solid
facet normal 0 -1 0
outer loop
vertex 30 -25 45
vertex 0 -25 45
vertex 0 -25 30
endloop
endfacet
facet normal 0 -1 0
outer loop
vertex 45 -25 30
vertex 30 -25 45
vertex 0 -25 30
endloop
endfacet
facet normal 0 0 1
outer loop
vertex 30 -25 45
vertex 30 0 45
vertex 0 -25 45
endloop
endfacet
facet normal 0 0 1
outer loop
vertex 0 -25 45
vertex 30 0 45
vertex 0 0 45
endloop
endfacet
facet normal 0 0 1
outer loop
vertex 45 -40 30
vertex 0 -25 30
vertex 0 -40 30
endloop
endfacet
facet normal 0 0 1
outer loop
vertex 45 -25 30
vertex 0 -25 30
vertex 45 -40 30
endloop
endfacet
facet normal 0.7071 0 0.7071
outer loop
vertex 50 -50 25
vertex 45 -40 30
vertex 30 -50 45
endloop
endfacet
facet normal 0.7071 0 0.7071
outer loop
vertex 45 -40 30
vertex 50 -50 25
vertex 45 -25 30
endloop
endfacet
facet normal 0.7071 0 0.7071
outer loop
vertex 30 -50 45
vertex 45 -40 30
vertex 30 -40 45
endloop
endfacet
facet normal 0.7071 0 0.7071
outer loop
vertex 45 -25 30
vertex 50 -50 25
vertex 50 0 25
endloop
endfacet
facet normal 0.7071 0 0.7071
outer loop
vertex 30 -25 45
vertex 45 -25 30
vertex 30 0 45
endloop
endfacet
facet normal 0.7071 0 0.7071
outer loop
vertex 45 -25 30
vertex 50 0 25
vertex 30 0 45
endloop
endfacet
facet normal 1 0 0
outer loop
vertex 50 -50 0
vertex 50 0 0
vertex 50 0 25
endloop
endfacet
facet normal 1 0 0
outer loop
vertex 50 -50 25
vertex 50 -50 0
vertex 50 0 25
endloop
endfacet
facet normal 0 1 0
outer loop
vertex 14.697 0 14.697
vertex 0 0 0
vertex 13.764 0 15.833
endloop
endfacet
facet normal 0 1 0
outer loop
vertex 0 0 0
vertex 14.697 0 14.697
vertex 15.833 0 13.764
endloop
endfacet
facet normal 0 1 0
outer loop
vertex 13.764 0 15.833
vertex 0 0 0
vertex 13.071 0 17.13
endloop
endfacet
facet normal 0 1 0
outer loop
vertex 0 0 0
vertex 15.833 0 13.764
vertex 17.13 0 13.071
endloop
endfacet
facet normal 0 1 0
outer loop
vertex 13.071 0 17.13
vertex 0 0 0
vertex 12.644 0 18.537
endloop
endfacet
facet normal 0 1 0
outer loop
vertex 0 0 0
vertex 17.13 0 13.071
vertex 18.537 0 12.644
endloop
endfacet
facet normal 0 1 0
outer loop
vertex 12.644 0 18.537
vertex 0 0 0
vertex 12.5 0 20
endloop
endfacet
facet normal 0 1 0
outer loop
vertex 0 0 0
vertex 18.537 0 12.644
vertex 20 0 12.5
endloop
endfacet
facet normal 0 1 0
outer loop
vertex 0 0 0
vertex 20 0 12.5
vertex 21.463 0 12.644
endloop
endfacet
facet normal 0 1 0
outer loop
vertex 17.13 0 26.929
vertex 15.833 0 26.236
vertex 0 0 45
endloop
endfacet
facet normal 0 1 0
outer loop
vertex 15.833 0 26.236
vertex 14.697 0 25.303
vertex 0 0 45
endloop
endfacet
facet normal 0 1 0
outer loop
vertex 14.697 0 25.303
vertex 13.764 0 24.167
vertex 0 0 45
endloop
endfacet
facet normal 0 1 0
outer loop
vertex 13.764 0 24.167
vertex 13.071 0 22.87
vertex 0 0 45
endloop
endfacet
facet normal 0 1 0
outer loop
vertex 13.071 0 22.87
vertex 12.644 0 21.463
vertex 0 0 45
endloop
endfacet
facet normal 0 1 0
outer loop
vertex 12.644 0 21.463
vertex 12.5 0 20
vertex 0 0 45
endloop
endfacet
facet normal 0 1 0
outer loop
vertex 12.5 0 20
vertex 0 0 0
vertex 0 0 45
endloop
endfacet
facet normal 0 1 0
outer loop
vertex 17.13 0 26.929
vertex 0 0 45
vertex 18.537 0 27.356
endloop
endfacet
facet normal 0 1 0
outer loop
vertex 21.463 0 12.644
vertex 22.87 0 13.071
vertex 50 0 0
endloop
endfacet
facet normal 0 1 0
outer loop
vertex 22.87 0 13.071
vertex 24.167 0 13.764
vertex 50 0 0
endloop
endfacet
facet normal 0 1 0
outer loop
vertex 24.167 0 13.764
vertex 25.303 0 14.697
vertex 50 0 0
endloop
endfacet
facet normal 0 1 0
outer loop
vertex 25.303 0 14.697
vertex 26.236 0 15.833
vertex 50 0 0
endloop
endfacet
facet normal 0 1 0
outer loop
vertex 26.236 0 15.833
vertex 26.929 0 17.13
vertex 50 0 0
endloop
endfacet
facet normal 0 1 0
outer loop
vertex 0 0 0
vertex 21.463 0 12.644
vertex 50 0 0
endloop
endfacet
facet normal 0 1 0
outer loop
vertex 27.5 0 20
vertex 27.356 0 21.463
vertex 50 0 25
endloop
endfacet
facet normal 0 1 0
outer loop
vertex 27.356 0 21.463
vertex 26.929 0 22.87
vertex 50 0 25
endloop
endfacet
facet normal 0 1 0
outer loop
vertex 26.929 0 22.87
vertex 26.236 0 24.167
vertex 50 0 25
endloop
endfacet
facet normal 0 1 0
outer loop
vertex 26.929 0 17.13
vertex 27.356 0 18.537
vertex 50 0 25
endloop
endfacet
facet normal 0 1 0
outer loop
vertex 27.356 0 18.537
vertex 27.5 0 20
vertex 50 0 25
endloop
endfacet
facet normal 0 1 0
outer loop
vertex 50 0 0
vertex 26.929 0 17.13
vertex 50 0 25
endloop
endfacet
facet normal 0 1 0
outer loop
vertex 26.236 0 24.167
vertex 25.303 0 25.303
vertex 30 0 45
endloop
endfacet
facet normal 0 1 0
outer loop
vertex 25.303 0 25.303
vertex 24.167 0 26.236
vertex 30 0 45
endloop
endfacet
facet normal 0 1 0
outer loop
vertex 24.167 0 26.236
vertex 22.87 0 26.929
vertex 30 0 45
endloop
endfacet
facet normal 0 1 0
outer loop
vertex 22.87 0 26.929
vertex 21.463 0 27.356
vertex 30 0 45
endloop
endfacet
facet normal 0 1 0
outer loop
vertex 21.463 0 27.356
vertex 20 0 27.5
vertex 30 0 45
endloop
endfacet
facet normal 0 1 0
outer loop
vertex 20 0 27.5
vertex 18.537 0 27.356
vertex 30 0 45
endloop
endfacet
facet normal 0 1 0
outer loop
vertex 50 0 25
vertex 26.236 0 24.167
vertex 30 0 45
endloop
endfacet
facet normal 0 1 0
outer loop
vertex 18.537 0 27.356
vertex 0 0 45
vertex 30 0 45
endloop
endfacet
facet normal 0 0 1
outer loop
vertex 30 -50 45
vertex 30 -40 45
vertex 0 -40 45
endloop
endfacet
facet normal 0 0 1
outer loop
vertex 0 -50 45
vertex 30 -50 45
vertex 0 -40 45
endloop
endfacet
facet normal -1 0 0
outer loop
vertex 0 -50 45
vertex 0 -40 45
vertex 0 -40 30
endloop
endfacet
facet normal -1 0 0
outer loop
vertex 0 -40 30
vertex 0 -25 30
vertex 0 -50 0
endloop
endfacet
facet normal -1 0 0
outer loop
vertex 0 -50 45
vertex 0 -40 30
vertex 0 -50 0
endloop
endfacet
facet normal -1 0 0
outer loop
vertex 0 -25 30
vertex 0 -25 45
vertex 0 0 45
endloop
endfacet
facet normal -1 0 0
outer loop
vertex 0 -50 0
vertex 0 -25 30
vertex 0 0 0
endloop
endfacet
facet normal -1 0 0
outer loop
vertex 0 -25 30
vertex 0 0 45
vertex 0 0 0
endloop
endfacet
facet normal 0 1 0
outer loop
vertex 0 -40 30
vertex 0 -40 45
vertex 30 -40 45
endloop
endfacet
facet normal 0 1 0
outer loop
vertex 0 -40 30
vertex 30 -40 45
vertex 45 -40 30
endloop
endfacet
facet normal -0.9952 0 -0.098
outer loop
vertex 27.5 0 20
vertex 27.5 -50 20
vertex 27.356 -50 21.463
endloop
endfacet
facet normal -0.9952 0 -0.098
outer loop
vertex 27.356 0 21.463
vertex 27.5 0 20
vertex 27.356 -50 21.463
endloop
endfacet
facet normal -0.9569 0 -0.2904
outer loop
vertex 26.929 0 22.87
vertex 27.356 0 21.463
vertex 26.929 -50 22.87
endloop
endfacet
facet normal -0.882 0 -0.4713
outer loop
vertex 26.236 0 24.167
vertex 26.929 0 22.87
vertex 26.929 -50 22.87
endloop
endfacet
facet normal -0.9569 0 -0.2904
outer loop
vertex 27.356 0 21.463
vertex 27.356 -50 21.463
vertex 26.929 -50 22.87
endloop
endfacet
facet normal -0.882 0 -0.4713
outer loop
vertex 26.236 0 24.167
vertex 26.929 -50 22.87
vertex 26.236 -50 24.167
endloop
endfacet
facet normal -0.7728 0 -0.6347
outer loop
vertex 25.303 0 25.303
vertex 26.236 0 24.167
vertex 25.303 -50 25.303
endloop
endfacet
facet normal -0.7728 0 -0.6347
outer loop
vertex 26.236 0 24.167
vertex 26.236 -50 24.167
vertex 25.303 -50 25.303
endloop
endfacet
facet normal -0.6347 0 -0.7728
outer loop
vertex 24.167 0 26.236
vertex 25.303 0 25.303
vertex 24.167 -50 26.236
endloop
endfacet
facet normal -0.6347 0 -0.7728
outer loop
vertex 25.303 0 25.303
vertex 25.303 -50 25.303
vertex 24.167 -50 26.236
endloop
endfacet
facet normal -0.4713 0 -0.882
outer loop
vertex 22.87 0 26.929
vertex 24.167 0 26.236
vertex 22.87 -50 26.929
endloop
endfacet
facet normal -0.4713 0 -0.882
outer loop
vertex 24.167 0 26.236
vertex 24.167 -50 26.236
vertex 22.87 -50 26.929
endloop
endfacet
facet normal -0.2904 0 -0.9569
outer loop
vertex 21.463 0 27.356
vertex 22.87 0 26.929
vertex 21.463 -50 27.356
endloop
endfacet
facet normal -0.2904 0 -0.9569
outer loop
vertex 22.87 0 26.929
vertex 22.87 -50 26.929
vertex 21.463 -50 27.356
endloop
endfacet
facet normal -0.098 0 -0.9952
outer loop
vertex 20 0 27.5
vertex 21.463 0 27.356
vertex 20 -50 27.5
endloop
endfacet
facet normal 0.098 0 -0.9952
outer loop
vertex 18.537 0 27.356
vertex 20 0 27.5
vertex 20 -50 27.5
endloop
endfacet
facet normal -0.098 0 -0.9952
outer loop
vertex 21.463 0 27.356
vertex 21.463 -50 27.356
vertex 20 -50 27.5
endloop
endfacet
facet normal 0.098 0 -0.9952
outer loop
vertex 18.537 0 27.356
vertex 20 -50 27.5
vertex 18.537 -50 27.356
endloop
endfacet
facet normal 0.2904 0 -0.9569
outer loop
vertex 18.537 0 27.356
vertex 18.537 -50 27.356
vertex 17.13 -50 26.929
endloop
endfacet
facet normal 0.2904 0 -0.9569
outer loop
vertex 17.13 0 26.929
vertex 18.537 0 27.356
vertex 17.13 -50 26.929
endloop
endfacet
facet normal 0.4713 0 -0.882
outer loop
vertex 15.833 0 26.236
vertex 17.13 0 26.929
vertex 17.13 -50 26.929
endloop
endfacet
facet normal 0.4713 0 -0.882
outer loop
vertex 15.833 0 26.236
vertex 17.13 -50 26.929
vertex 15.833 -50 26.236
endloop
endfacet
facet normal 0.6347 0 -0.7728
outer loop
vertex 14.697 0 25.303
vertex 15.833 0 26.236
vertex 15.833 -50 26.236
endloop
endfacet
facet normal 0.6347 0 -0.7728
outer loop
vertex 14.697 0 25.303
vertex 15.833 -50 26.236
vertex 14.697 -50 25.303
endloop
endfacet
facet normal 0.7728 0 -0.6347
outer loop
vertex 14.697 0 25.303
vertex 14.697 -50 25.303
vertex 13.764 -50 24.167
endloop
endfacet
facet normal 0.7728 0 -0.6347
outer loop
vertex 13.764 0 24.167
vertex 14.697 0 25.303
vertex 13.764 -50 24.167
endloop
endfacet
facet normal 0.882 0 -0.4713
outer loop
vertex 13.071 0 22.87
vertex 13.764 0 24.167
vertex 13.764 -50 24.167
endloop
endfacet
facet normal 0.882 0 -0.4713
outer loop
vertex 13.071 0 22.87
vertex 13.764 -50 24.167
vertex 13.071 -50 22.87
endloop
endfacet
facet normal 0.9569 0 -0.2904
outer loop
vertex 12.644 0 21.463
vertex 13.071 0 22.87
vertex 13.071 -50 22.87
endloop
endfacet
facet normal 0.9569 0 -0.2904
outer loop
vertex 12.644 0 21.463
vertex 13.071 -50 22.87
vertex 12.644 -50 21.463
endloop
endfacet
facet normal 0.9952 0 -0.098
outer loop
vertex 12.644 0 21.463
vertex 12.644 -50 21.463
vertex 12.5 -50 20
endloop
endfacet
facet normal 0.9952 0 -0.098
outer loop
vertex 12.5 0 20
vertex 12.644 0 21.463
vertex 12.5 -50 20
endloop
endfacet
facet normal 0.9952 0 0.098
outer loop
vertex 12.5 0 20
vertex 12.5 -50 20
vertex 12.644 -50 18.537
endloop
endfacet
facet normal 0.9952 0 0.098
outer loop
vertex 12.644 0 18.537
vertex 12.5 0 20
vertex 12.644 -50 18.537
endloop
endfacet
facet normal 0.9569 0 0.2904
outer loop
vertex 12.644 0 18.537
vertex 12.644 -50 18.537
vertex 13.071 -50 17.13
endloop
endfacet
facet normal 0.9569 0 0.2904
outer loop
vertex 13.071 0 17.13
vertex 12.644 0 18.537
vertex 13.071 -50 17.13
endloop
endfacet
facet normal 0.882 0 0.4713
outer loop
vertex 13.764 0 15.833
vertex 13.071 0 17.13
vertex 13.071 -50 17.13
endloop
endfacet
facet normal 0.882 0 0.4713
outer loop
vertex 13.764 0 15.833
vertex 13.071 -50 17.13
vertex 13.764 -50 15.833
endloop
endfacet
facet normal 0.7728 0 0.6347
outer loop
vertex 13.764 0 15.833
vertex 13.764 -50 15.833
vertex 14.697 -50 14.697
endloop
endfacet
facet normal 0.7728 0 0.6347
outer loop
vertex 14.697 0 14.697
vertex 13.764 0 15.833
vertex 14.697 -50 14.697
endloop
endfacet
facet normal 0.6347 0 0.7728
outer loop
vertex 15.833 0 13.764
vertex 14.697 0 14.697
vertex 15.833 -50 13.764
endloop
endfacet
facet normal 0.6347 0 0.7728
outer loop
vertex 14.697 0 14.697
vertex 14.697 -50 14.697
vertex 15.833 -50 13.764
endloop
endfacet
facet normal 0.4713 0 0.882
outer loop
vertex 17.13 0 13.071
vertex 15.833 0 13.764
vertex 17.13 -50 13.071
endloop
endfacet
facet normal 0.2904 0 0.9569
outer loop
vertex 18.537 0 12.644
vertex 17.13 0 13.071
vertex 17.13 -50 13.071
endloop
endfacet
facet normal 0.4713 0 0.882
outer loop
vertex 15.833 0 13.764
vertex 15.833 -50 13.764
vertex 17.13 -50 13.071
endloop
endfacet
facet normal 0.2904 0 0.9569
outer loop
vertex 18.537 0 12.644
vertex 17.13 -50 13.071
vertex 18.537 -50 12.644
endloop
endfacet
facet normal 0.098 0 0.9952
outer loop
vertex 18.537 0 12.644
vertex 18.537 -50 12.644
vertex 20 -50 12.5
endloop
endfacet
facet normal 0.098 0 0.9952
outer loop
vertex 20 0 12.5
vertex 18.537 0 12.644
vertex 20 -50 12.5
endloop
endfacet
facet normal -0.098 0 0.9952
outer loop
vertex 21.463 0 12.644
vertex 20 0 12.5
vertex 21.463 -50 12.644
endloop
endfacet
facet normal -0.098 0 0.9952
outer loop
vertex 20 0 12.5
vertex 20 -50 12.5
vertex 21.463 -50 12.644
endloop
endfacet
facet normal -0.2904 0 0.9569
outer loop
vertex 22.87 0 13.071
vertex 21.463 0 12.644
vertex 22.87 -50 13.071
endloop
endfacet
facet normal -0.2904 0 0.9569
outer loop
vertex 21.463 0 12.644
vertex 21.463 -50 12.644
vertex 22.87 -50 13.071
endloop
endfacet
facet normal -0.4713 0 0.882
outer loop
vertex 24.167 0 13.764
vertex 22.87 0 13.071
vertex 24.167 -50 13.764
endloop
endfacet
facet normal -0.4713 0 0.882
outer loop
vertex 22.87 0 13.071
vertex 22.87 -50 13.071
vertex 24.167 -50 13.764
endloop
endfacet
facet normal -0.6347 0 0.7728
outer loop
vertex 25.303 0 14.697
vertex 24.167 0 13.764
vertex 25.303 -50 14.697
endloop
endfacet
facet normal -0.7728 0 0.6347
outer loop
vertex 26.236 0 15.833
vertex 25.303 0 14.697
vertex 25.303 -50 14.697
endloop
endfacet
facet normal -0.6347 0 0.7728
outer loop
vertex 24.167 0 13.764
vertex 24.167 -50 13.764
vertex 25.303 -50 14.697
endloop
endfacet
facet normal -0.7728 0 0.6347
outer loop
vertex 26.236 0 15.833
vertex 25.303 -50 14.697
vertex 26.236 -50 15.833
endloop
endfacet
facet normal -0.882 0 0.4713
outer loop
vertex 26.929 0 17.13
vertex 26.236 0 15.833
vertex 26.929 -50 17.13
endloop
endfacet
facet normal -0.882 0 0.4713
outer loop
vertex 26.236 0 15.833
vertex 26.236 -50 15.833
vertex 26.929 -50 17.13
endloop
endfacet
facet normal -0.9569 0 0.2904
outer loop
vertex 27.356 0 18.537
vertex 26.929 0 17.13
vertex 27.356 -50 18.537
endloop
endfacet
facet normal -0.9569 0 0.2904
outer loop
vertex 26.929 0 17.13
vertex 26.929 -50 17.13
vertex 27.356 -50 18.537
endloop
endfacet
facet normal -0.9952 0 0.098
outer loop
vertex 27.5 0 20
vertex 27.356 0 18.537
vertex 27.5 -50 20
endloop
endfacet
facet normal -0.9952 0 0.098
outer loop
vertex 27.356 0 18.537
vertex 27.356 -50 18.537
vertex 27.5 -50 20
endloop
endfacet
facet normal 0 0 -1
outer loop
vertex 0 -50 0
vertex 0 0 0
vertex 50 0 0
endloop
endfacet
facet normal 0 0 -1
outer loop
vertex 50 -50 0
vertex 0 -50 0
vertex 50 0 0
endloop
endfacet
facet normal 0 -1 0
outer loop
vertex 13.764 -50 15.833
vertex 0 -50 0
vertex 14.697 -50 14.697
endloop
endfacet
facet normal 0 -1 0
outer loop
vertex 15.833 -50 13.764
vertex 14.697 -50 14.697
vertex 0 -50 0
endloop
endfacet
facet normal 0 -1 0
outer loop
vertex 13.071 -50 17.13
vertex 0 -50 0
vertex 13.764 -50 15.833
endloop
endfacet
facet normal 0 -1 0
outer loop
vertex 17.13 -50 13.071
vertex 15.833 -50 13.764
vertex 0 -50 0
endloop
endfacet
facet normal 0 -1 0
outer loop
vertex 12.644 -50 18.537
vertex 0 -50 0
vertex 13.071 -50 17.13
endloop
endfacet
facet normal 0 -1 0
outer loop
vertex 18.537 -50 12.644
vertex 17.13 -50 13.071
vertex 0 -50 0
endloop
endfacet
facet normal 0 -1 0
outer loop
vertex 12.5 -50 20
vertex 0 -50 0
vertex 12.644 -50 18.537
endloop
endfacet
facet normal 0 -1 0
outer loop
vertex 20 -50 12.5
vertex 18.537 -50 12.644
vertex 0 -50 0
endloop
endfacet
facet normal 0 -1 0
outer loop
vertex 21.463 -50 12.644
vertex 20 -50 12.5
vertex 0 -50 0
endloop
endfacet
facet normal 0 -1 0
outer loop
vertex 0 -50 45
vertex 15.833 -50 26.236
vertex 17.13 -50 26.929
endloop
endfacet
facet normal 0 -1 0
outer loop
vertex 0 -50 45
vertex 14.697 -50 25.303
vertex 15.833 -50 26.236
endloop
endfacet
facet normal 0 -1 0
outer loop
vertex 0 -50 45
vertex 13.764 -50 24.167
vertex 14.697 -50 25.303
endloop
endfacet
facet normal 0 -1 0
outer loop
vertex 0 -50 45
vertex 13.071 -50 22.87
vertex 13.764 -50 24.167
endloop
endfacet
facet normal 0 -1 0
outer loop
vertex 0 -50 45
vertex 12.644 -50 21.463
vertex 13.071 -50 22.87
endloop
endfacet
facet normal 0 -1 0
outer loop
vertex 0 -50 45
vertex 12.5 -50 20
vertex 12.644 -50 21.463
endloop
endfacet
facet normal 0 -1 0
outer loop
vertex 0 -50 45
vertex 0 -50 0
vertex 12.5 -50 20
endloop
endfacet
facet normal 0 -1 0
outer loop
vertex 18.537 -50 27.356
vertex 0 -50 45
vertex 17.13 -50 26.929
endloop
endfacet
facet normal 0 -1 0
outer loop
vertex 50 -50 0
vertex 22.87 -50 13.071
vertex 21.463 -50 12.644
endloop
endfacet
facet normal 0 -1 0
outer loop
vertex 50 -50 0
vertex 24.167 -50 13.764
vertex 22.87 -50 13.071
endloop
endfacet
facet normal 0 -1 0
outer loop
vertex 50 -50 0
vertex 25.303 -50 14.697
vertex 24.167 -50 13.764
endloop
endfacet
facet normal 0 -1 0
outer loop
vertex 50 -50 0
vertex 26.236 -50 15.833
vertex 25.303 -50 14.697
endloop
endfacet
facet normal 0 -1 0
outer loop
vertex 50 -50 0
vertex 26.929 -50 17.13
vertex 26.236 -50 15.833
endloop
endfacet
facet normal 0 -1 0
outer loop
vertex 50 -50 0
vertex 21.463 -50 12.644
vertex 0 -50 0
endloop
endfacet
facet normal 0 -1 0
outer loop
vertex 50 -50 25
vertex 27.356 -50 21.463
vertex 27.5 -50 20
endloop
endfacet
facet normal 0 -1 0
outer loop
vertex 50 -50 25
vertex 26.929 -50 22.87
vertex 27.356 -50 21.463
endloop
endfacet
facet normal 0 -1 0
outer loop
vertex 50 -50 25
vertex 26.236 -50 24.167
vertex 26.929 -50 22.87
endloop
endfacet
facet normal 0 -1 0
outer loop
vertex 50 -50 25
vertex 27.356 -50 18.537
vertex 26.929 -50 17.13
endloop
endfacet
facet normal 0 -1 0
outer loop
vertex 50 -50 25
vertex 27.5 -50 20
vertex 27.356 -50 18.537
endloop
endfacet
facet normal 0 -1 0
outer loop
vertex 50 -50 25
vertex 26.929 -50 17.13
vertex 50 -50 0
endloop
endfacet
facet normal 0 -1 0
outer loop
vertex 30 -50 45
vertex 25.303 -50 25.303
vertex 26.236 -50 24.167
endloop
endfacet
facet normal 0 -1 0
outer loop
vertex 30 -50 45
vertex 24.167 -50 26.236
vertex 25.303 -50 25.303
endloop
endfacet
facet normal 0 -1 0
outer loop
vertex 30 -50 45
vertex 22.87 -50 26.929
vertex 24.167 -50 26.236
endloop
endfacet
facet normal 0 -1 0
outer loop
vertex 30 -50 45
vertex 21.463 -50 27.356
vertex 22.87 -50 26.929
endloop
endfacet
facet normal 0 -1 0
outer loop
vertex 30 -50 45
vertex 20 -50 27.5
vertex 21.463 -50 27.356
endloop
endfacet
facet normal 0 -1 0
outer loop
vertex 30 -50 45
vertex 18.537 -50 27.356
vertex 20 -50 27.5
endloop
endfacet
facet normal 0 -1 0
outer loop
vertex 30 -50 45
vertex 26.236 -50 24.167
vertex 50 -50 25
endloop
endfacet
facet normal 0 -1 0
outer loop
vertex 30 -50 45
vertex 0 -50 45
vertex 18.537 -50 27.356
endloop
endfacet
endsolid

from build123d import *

# Parameters (mm, degrees)
F1_DEPTH = 50
F2_R     = 7.5
F3_DEPTH = 50.001
F5_W     = 50
F5_H     = 15
F6_DEPTH = 15


with BuildPart() as f1:
    # F0 (on Front) → F1 (new body)
    with BuildSketch(Plane.XZ):
        Polygon((0, 45), (0, 0), (50, 0), (50, 25), (30, 45), align=None)
    extrude(amount=F1_DEPTH)

    # F2 (on face) → F3 (cut, through all)
    with BuildSketch(Plane.XZ.offset(50)):
        with Locations((20, 20)):
            Circle(F2_R)
    extrude(amount=-F3_DEPTH, mode=Mode.SUBTRACT)

    # F5 (on face) → F6 (cut, through all)
    with BuildSketch(Plane.XY.offset(45)):
        with Locations((25, -32.5)):
            Rectangle(F5_W, F5_H)
    extrude(amount=-F6_DEPTH, mode=Mode.SUBTRACT)


solid = f1.part
